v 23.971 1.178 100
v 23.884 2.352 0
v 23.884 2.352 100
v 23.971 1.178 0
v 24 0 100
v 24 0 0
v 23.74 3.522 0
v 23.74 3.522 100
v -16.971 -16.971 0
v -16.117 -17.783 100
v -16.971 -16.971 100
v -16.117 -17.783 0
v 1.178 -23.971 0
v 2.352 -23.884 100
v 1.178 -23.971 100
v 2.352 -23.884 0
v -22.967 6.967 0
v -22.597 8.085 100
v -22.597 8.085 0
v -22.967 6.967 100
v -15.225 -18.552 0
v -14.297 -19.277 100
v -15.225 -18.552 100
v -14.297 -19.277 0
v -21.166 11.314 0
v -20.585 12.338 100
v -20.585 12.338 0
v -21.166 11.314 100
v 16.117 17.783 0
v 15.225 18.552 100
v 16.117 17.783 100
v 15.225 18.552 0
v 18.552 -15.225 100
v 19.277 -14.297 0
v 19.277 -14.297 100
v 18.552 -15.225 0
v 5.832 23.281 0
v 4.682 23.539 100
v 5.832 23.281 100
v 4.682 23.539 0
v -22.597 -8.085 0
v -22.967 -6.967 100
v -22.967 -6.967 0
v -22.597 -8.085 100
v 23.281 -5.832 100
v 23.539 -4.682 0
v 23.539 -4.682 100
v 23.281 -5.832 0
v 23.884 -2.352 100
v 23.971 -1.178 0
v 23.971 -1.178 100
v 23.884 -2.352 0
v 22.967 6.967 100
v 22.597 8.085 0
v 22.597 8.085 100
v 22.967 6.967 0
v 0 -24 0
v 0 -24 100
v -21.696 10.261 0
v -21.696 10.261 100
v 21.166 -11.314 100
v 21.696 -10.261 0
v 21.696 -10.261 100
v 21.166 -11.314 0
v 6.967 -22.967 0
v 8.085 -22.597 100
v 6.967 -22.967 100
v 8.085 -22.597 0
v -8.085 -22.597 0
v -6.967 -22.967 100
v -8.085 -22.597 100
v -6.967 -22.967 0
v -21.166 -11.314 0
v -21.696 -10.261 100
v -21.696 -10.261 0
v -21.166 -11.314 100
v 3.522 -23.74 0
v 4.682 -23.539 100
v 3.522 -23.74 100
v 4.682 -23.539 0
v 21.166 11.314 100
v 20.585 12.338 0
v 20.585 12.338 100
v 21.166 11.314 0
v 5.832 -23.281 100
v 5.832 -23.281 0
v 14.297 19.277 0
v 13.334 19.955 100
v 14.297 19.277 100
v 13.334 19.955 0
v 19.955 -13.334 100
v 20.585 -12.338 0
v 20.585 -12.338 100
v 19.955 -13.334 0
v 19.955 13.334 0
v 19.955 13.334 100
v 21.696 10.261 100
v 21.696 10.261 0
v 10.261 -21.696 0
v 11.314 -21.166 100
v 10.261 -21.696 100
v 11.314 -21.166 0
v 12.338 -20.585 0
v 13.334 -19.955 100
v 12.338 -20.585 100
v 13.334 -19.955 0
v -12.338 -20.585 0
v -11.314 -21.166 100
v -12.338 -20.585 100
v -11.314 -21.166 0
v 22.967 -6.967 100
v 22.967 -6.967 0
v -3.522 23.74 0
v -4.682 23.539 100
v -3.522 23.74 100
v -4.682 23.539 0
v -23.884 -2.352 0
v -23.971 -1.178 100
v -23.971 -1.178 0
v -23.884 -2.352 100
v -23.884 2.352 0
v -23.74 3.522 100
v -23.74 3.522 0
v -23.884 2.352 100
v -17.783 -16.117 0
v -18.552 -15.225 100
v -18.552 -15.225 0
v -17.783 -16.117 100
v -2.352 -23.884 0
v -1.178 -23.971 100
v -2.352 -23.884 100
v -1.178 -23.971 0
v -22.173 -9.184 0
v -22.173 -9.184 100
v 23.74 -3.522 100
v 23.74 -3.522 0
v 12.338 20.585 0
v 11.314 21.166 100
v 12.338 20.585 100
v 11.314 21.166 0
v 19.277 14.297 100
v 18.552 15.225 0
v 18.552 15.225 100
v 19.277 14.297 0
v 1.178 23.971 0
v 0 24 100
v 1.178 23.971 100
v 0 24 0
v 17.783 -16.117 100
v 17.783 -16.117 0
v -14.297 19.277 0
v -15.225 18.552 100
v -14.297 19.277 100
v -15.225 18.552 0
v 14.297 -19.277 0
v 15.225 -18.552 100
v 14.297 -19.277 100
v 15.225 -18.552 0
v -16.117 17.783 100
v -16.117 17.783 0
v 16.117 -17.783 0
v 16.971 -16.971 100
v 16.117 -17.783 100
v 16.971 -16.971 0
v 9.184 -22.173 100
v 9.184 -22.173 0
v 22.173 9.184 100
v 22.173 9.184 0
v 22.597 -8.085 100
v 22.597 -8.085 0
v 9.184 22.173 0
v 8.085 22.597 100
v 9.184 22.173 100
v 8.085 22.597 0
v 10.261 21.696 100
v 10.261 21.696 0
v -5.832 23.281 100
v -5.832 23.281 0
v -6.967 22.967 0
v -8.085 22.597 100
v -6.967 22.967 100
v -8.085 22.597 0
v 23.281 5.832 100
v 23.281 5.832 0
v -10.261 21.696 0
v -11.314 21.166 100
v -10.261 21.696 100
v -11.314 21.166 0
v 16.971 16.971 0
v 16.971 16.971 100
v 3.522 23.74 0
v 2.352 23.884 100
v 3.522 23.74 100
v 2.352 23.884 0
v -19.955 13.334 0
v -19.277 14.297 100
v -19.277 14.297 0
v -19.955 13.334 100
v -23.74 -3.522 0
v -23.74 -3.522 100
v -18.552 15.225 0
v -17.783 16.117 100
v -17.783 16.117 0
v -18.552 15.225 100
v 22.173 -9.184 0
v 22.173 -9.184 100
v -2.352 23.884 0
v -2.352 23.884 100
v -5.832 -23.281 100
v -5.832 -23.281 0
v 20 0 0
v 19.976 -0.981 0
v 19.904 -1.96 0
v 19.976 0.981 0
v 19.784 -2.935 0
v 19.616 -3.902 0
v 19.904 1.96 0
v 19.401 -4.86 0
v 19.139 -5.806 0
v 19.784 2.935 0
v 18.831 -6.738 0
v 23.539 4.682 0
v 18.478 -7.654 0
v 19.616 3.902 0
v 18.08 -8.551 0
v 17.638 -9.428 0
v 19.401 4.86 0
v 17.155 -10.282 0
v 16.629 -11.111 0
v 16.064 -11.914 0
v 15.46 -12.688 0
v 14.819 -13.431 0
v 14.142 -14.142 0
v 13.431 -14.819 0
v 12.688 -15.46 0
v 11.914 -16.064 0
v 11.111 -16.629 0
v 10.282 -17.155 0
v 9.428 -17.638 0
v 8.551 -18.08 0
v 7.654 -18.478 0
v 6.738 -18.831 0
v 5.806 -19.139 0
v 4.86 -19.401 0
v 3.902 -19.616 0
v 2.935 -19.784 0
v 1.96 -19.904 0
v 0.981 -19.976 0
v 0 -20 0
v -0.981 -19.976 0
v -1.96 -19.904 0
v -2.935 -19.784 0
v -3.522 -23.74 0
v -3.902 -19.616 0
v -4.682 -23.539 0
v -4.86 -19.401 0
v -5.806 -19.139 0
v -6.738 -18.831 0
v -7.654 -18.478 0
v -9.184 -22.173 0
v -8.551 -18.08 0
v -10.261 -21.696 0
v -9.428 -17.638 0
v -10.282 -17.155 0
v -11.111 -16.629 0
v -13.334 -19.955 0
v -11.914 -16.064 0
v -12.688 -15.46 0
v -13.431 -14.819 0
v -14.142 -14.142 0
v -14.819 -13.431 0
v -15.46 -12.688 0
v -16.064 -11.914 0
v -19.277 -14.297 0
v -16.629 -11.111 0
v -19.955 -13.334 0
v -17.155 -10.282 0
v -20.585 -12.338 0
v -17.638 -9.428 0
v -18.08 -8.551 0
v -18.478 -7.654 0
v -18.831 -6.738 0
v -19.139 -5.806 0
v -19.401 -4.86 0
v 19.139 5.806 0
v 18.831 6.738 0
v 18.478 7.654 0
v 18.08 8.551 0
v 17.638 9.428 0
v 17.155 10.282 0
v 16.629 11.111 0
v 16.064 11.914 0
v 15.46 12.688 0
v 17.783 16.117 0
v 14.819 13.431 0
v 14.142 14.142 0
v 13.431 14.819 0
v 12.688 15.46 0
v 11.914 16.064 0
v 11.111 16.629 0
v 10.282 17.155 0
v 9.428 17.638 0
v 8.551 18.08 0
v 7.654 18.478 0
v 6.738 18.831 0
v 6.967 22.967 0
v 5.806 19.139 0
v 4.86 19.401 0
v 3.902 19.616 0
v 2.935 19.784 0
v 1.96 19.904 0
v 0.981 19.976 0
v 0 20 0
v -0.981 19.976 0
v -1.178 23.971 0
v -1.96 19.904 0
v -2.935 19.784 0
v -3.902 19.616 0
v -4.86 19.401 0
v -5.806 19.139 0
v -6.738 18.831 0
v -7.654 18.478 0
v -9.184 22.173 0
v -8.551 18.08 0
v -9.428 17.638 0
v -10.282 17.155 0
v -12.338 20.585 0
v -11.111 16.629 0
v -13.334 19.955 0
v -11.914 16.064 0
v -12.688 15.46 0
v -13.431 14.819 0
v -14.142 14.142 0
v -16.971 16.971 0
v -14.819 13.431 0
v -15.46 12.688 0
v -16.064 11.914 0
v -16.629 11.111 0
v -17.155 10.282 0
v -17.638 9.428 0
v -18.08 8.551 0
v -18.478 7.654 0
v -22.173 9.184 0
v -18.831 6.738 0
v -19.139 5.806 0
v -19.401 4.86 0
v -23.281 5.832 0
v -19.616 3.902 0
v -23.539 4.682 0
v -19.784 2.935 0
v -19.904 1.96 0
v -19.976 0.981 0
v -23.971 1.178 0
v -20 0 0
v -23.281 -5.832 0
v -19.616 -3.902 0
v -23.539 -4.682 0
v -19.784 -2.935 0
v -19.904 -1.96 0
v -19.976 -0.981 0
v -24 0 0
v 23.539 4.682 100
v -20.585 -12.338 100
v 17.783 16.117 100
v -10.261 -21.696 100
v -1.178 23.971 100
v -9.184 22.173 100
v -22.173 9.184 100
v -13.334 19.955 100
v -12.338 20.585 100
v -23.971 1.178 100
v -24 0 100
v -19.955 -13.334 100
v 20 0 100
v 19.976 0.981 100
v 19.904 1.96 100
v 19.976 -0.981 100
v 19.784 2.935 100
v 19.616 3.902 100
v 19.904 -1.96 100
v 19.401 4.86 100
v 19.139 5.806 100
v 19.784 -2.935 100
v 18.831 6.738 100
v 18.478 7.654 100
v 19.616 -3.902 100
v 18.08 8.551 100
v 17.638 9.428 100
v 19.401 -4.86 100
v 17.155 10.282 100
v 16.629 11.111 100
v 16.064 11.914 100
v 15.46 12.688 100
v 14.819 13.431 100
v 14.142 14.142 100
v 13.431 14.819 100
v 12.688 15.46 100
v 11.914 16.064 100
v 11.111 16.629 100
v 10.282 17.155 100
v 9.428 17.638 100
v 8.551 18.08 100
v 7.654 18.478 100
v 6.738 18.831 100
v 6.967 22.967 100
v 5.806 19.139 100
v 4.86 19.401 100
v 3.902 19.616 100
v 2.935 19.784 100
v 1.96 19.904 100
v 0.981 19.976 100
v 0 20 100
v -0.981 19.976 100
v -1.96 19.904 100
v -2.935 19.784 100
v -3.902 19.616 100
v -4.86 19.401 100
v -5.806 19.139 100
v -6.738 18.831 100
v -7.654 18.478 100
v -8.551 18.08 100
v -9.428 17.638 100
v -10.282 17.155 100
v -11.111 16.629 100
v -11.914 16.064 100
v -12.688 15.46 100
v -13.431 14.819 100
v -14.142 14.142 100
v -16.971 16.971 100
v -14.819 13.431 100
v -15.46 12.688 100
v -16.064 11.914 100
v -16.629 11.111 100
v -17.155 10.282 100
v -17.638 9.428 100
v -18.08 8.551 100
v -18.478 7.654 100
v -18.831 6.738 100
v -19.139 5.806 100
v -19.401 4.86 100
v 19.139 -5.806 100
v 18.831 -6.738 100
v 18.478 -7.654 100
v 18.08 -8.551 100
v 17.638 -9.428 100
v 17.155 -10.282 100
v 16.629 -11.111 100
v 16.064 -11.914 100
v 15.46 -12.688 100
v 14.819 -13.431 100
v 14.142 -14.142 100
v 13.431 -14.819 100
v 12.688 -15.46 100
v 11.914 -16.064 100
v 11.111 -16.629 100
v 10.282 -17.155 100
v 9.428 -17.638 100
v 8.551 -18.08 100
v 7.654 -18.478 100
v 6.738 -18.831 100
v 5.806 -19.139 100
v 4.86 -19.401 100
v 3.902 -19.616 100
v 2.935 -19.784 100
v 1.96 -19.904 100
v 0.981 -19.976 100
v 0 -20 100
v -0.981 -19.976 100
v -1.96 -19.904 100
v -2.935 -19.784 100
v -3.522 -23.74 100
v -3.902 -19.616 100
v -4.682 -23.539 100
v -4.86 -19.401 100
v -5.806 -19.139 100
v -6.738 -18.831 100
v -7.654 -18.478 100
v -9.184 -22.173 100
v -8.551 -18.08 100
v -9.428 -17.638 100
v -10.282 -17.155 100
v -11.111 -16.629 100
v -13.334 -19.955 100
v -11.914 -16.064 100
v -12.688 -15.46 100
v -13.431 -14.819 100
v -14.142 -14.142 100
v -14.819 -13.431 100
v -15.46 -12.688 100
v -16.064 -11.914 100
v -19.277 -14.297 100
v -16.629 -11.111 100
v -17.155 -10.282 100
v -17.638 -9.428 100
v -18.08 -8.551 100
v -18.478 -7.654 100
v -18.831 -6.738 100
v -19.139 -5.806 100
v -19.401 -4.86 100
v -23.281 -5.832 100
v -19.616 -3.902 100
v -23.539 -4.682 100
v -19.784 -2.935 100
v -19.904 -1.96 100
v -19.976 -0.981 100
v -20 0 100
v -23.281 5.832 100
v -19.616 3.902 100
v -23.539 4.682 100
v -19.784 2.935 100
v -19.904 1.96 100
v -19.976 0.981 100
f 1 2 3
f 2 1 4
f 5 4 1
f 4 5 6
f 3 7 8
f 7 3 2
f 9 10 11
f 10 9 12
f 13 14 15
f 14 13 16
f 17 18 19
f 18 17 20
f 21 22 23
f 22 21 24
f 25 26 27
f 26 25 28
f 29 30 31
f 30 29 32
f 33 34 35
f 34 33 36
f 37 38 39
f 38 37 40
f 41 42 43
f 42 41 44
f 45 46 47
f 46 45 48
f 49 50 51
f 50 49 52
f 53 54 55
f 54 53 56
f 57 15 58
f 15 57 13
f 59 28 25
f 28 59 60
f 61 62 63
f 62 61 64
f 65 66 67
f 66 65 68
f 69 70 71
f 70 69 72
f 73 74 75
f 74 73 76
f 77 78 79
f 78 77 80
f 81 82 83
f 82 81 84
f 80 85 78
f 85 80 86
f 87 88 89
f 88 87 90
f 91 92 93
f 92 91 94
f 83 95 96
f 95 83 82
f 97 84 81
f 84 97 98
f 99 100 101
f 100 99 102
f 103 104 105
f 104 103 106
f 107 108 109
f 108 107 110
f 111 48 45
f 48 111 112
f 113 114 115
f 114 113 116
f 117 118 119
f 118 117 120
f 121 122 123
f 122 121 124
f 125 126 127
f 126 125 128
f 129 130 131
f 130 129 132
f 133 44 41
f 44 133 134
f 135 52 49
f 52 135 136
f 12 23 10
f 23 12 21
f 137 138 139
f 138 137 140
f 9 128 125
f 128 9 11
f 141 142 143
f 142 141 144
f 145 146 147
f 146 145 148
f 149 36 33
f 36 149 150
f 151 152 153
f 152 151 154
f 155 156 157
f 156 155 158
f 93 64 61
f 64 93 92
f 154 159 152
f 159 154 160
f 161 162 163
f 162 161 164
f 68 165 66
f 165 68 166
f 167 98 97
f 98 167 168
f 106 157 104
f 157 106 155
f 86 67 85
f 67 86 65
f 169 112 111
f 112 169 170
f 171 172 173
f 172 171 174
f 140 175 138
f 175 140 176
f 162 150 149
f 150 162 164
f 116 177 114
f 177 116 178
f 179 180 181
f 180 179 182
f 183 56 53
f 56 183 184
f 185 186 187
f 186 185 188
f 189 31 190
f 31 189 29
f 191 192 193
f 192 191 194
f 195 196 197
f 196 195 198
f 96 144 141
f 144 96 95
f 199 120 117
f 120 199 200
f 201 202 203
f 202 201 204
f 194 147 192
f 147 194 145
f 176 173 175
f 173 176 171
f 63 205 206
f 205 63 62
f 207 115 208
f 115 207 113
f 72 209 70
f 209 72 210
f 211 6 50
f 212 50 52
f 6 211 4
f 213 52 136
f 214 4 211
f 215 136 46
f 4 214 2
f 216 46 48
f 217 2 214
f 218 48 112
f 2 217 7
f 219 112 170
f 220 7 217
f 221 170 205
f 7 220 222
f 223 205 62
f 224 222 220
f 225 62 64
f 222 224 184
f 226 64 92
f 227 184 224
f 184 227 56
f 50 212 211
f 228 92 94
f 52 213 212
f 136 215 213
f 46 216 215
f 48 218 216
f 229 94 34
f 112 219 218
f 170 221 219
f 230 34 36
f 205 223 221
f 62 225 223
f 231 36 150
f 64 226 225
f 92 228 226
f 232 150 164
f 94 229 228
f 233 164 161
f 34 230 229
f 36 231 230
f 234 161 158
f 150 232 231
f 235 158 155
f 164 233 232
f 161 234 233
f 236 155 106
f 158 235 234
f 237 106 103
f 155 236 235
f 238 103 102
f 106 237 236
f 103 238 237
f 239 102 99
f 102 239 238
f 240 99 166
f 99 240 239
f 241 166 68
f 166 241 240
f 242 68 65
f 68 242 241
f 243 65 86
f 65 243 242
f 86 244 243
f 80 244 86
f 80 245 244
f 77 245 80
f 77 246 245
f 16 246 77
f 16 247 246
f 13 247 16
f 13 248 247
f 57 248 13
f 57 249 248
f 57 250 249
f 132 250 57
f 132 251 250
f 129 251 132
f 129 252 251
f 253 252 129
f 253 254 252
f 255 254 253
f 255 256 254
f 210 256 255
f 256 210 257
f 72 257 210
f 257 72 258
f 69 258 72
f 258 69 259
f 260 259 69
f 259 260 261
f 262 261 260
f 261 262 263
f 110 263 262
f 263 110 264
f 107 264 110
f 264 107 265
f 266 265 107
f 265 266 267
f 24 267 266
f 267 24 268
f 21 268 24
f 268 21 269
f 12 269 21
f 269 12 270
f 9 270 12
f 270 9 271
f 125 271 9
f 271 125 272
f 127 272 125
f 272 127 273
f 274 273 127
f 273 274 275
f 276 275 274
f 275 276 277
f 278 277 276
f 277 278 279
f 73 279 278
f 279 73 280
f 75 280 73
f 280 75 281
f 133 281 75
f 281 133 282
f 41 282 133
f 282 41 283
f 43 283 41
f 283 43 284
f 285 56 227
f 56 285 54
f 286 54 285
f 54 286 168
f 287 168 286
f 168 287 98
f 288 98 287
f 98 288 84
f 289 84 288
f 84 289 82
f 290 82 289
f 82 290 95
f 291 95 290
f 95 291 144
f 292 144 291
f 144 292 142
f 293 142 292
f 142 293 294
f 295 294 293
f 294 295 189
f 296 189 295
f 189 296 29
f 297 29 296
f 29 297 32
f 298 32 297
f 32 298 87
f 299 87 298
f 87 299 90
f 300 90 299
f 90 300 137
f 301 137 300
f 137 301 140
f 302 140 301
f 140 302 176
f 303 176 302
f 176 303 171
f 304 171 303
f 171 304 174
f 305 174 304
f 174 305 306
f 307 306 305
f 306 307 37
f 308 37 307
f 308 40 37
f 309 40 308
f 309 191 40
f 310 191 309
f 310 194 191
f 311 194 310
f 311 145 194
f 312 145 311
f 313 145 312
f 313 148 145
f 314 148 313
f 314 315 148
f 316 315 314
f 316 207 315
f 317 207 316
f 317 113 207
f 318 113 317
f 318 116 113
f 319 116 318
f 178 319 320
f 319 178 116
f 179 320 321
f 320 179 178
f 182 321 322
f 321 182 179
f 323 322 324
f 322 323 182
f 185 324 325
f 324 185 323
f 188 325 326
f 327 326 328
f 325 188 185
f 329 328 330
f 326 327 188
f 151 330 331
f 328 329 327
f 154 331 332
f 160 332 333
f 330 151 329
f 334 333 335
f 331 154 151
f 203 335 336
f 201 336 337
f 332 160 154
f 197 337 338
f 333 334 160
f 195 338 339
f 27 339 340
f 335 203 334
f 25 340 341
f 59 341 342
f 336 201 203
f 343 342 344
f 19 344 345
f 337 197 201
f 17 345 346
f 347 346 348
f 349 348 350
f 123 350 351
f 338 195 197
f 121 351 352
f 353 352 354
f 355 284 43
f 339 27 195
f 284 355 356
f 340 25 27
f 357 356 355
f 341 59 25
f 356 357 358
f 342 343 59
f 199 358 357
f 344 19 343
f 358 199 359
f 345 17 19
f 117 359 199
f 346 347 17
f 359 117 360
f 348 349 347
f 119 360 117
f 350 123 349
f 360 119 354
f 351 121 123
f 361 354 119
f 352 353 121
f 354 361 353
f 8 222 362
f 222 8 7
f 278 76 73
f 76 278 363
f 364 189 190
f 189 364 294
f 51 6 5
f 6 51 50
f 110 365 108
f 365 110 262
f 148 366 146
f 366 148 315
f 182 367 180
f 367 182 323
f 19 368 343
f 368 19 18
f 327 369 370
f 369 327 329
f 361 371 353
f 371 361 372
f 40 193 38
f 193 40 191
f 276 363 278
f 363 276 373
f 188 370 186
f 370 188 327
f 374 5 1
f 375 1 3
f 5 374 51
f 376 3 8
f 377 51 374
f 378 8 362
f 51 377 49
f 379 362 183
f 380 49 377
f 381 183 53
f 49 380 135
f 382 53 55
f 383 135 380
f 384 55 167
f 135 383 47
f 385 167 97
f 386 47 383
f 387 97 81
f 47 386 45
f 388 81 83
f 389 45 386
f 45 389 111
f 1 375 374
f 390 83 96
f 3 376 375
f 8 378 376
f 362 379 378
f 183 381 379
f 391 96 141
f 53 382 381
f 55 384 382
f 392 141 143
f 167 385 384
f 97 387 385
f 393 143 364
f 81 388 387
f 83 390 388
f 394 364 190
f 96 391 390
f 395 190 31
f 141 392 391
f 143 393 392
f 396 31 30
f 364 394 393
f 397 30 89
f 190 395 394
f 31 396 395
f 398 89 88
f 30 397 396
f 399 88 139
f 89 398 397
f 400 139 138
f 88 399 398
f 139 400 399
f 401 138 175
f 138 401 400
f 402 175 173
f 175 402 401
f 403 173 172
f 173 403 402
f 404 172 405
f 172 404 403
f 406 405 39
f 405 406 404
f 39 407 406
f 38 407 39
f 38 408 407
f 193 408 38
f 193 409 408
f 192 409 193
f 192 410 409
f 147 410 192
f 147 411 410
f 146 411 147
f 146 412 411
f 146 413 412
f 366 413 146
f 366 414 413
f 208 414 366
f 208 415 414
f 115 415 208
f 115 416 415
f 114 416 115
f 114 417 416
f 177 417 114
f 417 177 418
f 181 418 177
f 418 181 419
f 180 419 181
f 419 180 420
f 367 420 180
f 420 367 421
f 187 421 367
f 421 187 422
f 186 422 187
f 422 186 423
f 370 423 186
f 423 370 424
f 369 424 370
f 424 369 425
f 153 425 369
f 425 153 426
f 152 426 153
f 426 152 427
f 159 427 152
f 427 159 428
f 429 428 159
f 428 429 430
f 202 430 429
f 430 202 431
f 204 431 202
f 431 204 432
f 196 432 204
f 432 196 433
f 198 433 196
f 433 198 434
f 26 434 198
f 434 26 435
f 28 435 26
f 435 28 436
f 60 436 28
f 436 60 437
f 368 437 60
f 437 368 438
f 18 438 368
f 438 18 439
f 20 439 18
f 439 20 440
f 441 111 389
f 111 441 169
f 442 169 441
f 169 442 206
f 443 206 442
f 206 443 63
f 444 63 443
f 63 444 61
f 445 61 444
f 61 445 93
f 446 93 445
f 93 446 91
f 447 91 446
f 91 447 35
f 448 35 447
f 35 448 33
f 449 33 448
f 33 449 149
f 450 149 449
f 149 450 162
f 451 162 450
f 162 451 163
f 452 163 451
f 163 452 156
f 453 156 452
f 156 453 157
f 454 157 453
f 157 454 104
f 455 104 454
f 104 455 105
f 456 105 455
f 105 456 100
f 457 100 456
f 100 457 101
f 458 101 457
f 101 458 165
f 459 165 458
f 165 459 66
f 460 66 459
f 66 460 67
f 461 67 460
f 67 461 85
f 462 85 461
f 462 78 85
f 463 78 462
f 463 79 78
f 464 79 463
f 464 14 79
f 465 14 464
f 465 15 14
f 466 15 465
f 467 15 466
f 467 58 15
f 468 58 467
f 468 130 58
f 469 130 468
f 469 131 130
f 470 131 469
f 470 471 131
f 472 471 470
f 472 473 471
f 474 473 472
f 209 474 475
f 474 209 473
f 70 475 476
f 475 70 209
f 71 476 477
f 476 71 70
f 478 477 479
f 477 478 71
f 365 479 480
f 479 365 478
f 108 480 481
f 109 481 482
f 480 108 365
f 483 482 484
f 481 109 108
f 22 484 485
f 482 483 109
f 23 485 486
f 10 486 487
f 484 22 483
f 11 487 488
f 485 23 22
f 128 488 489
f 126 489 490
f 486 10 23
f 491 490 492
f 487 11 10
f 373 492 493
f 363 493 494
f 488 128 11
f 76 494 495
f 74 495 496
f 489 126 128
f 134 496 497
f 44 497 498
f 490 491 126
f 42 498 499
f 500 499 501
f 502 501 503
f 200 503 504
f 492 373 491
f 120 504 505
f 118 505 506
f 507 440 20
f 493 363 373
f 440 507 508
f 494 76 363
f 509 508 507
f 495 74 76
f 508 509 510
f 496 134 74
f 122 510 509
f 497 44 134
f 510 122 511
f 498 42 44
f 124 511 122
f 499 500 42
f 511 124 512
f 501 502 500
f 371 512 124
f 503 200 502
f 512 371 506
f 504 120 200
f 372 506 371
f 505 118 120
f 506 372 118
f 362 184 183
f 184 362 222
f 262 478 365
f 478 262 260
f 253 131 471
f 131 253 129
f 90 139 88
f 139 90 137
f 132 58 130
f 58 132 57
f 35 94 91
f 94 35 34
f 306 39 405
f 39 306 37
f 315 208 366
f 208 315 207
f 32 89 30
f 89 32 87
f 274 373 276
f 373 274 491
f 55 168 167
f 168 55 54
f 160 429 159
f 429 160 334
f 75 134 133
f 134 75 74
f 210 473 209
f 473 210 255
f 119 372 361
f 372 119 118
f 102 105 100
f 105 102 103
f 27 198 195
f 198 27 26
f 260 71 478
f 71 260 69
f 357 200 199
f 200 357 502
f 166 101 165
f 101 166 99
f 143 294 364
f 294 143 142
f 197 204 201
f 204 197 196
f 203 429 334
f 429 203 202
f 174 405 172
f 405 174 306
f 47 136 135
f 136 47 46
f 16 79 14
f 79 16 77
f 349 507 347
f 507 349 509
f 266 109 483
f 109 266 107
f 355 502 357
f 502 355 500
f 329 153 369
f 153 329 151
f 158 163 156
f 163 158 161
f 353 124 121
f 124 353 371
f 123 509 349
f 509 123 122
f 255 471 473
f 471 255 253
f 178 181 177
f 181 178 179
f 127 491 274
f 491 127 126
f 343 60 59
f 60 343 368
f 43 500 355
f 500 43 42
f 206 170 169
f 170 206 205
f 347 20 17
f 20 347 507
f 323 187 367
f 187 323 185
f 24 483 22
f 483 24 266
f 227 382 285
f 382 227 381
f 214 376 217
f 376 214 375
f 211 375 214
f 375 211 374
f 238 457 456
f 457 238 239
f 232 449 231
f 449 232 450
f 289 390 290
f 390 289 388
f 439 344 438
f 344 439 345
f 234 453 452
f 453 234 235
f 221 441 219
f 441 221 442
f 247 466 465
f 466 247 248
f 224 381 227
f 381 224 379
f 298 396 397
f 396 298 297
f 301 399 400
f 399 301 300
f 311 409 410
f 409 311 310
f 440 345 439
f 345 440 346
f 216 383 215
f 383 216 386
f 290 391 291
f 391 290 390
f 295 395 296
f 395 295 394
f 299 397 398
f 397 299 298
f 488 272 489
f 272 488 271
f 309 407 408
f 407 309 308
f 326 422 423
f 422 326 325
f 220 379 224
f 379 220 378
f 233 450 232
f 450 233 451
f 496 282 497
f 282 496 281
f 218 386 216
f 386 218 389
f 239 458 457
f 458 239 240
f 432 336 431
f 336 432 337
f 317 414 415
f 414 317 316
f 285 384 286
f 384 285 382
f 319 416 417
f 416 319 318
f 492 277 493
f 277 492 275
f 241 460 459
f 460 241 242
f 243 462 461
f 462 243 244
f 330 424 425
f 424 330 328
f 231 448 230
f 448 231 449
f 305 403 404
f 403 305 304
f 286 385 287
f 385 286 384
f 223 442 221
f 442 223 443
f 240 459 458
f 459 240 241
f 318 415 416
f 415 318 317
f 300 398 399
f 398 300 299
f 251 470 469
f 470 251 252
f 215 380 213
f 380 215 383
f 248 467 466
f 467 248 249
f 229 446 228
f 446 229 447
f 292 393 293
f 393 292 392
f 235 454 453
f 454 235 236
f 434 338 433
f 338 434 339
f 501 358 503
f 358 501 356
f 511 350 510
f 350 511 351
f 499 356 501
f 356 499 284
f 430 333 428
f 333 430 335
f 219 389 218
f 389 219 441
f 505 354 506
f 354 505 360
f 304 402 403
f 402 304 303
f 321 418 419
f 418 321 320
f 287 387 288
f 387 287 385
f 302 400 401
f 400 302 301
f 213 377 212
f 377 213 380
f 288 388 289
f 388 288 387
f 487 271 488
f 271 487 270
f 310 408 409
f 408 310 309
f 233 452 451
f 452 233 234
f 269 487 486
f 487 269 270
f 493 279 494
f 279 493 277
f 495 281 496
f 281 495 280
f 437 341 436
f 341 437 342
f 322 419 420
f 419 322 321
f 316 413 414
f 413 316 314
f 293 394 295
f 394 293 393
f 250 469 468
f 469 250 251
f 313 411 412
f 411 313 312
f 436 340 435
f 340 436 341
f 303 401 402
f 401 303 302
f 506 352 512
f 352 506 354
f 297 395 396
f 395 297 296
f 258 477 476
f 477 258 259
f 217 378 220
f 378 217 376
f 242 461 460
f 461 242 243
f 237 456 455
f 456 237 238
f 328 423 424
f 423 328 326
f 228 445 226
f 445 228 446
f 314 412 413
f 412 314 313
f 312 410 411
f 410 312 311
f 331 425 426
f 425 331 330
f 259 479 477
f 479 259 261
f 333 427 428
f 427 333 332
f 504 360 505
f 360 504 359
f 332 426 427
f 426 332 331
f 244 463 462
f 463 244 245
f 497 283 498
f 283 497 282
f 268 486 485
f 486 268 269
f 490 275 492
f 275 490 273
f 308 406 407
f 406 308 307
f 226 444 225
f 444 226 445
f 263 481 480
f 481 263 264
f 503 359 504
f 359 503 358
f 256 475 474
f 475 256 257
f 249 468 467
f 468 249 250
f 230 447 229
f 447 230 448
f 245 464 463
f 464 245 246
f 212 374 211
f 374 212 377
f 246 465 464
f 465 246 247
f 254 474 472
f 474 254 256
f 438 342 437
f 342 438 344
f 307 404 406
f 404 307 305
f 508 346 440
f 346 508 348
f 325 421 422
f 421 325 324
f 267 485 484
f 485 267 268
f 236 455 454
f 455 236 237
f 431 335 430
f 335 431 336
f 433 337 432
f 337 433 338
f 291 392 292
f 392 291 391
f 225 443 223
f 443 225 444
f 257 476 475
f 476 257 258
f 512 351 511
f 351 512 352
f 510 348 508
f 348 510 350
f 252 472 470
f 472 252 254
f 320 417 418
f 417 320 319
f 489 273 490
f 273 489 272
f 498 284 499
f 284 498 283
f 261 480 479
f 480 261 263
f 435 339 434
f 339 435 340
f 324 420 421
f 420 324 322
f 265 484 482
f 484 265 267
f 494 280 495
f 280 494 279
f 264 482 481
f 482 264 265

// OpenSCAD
// file: ../stub_tube.scad
// A tube standing on the bed with its bore through: what the dust category's
// stand-ins are drawn as, until the real hose and fittings are measured. A
// library the parts include, not a part.
module stub_tube(bore, outer, length) {
    difference() {
        cylinder(h = length, d = outer);
        translate([0, 0, -1]) cylinder(h = length + 2, d = bore);
    }
}
// main file
// A stand-in for a smooth 40 mm bore dust hose, until it is measured: 100 mm of
// it, its end at the top. part.json declares that end as a socket that opens
// 5% when pushed, a guess for rubber or PVC.

include <../stub_tube.scad>

bore = 40;
outer = 48;
length = 100;
$fn = 128;

stub_tube(bore, outer, length);
